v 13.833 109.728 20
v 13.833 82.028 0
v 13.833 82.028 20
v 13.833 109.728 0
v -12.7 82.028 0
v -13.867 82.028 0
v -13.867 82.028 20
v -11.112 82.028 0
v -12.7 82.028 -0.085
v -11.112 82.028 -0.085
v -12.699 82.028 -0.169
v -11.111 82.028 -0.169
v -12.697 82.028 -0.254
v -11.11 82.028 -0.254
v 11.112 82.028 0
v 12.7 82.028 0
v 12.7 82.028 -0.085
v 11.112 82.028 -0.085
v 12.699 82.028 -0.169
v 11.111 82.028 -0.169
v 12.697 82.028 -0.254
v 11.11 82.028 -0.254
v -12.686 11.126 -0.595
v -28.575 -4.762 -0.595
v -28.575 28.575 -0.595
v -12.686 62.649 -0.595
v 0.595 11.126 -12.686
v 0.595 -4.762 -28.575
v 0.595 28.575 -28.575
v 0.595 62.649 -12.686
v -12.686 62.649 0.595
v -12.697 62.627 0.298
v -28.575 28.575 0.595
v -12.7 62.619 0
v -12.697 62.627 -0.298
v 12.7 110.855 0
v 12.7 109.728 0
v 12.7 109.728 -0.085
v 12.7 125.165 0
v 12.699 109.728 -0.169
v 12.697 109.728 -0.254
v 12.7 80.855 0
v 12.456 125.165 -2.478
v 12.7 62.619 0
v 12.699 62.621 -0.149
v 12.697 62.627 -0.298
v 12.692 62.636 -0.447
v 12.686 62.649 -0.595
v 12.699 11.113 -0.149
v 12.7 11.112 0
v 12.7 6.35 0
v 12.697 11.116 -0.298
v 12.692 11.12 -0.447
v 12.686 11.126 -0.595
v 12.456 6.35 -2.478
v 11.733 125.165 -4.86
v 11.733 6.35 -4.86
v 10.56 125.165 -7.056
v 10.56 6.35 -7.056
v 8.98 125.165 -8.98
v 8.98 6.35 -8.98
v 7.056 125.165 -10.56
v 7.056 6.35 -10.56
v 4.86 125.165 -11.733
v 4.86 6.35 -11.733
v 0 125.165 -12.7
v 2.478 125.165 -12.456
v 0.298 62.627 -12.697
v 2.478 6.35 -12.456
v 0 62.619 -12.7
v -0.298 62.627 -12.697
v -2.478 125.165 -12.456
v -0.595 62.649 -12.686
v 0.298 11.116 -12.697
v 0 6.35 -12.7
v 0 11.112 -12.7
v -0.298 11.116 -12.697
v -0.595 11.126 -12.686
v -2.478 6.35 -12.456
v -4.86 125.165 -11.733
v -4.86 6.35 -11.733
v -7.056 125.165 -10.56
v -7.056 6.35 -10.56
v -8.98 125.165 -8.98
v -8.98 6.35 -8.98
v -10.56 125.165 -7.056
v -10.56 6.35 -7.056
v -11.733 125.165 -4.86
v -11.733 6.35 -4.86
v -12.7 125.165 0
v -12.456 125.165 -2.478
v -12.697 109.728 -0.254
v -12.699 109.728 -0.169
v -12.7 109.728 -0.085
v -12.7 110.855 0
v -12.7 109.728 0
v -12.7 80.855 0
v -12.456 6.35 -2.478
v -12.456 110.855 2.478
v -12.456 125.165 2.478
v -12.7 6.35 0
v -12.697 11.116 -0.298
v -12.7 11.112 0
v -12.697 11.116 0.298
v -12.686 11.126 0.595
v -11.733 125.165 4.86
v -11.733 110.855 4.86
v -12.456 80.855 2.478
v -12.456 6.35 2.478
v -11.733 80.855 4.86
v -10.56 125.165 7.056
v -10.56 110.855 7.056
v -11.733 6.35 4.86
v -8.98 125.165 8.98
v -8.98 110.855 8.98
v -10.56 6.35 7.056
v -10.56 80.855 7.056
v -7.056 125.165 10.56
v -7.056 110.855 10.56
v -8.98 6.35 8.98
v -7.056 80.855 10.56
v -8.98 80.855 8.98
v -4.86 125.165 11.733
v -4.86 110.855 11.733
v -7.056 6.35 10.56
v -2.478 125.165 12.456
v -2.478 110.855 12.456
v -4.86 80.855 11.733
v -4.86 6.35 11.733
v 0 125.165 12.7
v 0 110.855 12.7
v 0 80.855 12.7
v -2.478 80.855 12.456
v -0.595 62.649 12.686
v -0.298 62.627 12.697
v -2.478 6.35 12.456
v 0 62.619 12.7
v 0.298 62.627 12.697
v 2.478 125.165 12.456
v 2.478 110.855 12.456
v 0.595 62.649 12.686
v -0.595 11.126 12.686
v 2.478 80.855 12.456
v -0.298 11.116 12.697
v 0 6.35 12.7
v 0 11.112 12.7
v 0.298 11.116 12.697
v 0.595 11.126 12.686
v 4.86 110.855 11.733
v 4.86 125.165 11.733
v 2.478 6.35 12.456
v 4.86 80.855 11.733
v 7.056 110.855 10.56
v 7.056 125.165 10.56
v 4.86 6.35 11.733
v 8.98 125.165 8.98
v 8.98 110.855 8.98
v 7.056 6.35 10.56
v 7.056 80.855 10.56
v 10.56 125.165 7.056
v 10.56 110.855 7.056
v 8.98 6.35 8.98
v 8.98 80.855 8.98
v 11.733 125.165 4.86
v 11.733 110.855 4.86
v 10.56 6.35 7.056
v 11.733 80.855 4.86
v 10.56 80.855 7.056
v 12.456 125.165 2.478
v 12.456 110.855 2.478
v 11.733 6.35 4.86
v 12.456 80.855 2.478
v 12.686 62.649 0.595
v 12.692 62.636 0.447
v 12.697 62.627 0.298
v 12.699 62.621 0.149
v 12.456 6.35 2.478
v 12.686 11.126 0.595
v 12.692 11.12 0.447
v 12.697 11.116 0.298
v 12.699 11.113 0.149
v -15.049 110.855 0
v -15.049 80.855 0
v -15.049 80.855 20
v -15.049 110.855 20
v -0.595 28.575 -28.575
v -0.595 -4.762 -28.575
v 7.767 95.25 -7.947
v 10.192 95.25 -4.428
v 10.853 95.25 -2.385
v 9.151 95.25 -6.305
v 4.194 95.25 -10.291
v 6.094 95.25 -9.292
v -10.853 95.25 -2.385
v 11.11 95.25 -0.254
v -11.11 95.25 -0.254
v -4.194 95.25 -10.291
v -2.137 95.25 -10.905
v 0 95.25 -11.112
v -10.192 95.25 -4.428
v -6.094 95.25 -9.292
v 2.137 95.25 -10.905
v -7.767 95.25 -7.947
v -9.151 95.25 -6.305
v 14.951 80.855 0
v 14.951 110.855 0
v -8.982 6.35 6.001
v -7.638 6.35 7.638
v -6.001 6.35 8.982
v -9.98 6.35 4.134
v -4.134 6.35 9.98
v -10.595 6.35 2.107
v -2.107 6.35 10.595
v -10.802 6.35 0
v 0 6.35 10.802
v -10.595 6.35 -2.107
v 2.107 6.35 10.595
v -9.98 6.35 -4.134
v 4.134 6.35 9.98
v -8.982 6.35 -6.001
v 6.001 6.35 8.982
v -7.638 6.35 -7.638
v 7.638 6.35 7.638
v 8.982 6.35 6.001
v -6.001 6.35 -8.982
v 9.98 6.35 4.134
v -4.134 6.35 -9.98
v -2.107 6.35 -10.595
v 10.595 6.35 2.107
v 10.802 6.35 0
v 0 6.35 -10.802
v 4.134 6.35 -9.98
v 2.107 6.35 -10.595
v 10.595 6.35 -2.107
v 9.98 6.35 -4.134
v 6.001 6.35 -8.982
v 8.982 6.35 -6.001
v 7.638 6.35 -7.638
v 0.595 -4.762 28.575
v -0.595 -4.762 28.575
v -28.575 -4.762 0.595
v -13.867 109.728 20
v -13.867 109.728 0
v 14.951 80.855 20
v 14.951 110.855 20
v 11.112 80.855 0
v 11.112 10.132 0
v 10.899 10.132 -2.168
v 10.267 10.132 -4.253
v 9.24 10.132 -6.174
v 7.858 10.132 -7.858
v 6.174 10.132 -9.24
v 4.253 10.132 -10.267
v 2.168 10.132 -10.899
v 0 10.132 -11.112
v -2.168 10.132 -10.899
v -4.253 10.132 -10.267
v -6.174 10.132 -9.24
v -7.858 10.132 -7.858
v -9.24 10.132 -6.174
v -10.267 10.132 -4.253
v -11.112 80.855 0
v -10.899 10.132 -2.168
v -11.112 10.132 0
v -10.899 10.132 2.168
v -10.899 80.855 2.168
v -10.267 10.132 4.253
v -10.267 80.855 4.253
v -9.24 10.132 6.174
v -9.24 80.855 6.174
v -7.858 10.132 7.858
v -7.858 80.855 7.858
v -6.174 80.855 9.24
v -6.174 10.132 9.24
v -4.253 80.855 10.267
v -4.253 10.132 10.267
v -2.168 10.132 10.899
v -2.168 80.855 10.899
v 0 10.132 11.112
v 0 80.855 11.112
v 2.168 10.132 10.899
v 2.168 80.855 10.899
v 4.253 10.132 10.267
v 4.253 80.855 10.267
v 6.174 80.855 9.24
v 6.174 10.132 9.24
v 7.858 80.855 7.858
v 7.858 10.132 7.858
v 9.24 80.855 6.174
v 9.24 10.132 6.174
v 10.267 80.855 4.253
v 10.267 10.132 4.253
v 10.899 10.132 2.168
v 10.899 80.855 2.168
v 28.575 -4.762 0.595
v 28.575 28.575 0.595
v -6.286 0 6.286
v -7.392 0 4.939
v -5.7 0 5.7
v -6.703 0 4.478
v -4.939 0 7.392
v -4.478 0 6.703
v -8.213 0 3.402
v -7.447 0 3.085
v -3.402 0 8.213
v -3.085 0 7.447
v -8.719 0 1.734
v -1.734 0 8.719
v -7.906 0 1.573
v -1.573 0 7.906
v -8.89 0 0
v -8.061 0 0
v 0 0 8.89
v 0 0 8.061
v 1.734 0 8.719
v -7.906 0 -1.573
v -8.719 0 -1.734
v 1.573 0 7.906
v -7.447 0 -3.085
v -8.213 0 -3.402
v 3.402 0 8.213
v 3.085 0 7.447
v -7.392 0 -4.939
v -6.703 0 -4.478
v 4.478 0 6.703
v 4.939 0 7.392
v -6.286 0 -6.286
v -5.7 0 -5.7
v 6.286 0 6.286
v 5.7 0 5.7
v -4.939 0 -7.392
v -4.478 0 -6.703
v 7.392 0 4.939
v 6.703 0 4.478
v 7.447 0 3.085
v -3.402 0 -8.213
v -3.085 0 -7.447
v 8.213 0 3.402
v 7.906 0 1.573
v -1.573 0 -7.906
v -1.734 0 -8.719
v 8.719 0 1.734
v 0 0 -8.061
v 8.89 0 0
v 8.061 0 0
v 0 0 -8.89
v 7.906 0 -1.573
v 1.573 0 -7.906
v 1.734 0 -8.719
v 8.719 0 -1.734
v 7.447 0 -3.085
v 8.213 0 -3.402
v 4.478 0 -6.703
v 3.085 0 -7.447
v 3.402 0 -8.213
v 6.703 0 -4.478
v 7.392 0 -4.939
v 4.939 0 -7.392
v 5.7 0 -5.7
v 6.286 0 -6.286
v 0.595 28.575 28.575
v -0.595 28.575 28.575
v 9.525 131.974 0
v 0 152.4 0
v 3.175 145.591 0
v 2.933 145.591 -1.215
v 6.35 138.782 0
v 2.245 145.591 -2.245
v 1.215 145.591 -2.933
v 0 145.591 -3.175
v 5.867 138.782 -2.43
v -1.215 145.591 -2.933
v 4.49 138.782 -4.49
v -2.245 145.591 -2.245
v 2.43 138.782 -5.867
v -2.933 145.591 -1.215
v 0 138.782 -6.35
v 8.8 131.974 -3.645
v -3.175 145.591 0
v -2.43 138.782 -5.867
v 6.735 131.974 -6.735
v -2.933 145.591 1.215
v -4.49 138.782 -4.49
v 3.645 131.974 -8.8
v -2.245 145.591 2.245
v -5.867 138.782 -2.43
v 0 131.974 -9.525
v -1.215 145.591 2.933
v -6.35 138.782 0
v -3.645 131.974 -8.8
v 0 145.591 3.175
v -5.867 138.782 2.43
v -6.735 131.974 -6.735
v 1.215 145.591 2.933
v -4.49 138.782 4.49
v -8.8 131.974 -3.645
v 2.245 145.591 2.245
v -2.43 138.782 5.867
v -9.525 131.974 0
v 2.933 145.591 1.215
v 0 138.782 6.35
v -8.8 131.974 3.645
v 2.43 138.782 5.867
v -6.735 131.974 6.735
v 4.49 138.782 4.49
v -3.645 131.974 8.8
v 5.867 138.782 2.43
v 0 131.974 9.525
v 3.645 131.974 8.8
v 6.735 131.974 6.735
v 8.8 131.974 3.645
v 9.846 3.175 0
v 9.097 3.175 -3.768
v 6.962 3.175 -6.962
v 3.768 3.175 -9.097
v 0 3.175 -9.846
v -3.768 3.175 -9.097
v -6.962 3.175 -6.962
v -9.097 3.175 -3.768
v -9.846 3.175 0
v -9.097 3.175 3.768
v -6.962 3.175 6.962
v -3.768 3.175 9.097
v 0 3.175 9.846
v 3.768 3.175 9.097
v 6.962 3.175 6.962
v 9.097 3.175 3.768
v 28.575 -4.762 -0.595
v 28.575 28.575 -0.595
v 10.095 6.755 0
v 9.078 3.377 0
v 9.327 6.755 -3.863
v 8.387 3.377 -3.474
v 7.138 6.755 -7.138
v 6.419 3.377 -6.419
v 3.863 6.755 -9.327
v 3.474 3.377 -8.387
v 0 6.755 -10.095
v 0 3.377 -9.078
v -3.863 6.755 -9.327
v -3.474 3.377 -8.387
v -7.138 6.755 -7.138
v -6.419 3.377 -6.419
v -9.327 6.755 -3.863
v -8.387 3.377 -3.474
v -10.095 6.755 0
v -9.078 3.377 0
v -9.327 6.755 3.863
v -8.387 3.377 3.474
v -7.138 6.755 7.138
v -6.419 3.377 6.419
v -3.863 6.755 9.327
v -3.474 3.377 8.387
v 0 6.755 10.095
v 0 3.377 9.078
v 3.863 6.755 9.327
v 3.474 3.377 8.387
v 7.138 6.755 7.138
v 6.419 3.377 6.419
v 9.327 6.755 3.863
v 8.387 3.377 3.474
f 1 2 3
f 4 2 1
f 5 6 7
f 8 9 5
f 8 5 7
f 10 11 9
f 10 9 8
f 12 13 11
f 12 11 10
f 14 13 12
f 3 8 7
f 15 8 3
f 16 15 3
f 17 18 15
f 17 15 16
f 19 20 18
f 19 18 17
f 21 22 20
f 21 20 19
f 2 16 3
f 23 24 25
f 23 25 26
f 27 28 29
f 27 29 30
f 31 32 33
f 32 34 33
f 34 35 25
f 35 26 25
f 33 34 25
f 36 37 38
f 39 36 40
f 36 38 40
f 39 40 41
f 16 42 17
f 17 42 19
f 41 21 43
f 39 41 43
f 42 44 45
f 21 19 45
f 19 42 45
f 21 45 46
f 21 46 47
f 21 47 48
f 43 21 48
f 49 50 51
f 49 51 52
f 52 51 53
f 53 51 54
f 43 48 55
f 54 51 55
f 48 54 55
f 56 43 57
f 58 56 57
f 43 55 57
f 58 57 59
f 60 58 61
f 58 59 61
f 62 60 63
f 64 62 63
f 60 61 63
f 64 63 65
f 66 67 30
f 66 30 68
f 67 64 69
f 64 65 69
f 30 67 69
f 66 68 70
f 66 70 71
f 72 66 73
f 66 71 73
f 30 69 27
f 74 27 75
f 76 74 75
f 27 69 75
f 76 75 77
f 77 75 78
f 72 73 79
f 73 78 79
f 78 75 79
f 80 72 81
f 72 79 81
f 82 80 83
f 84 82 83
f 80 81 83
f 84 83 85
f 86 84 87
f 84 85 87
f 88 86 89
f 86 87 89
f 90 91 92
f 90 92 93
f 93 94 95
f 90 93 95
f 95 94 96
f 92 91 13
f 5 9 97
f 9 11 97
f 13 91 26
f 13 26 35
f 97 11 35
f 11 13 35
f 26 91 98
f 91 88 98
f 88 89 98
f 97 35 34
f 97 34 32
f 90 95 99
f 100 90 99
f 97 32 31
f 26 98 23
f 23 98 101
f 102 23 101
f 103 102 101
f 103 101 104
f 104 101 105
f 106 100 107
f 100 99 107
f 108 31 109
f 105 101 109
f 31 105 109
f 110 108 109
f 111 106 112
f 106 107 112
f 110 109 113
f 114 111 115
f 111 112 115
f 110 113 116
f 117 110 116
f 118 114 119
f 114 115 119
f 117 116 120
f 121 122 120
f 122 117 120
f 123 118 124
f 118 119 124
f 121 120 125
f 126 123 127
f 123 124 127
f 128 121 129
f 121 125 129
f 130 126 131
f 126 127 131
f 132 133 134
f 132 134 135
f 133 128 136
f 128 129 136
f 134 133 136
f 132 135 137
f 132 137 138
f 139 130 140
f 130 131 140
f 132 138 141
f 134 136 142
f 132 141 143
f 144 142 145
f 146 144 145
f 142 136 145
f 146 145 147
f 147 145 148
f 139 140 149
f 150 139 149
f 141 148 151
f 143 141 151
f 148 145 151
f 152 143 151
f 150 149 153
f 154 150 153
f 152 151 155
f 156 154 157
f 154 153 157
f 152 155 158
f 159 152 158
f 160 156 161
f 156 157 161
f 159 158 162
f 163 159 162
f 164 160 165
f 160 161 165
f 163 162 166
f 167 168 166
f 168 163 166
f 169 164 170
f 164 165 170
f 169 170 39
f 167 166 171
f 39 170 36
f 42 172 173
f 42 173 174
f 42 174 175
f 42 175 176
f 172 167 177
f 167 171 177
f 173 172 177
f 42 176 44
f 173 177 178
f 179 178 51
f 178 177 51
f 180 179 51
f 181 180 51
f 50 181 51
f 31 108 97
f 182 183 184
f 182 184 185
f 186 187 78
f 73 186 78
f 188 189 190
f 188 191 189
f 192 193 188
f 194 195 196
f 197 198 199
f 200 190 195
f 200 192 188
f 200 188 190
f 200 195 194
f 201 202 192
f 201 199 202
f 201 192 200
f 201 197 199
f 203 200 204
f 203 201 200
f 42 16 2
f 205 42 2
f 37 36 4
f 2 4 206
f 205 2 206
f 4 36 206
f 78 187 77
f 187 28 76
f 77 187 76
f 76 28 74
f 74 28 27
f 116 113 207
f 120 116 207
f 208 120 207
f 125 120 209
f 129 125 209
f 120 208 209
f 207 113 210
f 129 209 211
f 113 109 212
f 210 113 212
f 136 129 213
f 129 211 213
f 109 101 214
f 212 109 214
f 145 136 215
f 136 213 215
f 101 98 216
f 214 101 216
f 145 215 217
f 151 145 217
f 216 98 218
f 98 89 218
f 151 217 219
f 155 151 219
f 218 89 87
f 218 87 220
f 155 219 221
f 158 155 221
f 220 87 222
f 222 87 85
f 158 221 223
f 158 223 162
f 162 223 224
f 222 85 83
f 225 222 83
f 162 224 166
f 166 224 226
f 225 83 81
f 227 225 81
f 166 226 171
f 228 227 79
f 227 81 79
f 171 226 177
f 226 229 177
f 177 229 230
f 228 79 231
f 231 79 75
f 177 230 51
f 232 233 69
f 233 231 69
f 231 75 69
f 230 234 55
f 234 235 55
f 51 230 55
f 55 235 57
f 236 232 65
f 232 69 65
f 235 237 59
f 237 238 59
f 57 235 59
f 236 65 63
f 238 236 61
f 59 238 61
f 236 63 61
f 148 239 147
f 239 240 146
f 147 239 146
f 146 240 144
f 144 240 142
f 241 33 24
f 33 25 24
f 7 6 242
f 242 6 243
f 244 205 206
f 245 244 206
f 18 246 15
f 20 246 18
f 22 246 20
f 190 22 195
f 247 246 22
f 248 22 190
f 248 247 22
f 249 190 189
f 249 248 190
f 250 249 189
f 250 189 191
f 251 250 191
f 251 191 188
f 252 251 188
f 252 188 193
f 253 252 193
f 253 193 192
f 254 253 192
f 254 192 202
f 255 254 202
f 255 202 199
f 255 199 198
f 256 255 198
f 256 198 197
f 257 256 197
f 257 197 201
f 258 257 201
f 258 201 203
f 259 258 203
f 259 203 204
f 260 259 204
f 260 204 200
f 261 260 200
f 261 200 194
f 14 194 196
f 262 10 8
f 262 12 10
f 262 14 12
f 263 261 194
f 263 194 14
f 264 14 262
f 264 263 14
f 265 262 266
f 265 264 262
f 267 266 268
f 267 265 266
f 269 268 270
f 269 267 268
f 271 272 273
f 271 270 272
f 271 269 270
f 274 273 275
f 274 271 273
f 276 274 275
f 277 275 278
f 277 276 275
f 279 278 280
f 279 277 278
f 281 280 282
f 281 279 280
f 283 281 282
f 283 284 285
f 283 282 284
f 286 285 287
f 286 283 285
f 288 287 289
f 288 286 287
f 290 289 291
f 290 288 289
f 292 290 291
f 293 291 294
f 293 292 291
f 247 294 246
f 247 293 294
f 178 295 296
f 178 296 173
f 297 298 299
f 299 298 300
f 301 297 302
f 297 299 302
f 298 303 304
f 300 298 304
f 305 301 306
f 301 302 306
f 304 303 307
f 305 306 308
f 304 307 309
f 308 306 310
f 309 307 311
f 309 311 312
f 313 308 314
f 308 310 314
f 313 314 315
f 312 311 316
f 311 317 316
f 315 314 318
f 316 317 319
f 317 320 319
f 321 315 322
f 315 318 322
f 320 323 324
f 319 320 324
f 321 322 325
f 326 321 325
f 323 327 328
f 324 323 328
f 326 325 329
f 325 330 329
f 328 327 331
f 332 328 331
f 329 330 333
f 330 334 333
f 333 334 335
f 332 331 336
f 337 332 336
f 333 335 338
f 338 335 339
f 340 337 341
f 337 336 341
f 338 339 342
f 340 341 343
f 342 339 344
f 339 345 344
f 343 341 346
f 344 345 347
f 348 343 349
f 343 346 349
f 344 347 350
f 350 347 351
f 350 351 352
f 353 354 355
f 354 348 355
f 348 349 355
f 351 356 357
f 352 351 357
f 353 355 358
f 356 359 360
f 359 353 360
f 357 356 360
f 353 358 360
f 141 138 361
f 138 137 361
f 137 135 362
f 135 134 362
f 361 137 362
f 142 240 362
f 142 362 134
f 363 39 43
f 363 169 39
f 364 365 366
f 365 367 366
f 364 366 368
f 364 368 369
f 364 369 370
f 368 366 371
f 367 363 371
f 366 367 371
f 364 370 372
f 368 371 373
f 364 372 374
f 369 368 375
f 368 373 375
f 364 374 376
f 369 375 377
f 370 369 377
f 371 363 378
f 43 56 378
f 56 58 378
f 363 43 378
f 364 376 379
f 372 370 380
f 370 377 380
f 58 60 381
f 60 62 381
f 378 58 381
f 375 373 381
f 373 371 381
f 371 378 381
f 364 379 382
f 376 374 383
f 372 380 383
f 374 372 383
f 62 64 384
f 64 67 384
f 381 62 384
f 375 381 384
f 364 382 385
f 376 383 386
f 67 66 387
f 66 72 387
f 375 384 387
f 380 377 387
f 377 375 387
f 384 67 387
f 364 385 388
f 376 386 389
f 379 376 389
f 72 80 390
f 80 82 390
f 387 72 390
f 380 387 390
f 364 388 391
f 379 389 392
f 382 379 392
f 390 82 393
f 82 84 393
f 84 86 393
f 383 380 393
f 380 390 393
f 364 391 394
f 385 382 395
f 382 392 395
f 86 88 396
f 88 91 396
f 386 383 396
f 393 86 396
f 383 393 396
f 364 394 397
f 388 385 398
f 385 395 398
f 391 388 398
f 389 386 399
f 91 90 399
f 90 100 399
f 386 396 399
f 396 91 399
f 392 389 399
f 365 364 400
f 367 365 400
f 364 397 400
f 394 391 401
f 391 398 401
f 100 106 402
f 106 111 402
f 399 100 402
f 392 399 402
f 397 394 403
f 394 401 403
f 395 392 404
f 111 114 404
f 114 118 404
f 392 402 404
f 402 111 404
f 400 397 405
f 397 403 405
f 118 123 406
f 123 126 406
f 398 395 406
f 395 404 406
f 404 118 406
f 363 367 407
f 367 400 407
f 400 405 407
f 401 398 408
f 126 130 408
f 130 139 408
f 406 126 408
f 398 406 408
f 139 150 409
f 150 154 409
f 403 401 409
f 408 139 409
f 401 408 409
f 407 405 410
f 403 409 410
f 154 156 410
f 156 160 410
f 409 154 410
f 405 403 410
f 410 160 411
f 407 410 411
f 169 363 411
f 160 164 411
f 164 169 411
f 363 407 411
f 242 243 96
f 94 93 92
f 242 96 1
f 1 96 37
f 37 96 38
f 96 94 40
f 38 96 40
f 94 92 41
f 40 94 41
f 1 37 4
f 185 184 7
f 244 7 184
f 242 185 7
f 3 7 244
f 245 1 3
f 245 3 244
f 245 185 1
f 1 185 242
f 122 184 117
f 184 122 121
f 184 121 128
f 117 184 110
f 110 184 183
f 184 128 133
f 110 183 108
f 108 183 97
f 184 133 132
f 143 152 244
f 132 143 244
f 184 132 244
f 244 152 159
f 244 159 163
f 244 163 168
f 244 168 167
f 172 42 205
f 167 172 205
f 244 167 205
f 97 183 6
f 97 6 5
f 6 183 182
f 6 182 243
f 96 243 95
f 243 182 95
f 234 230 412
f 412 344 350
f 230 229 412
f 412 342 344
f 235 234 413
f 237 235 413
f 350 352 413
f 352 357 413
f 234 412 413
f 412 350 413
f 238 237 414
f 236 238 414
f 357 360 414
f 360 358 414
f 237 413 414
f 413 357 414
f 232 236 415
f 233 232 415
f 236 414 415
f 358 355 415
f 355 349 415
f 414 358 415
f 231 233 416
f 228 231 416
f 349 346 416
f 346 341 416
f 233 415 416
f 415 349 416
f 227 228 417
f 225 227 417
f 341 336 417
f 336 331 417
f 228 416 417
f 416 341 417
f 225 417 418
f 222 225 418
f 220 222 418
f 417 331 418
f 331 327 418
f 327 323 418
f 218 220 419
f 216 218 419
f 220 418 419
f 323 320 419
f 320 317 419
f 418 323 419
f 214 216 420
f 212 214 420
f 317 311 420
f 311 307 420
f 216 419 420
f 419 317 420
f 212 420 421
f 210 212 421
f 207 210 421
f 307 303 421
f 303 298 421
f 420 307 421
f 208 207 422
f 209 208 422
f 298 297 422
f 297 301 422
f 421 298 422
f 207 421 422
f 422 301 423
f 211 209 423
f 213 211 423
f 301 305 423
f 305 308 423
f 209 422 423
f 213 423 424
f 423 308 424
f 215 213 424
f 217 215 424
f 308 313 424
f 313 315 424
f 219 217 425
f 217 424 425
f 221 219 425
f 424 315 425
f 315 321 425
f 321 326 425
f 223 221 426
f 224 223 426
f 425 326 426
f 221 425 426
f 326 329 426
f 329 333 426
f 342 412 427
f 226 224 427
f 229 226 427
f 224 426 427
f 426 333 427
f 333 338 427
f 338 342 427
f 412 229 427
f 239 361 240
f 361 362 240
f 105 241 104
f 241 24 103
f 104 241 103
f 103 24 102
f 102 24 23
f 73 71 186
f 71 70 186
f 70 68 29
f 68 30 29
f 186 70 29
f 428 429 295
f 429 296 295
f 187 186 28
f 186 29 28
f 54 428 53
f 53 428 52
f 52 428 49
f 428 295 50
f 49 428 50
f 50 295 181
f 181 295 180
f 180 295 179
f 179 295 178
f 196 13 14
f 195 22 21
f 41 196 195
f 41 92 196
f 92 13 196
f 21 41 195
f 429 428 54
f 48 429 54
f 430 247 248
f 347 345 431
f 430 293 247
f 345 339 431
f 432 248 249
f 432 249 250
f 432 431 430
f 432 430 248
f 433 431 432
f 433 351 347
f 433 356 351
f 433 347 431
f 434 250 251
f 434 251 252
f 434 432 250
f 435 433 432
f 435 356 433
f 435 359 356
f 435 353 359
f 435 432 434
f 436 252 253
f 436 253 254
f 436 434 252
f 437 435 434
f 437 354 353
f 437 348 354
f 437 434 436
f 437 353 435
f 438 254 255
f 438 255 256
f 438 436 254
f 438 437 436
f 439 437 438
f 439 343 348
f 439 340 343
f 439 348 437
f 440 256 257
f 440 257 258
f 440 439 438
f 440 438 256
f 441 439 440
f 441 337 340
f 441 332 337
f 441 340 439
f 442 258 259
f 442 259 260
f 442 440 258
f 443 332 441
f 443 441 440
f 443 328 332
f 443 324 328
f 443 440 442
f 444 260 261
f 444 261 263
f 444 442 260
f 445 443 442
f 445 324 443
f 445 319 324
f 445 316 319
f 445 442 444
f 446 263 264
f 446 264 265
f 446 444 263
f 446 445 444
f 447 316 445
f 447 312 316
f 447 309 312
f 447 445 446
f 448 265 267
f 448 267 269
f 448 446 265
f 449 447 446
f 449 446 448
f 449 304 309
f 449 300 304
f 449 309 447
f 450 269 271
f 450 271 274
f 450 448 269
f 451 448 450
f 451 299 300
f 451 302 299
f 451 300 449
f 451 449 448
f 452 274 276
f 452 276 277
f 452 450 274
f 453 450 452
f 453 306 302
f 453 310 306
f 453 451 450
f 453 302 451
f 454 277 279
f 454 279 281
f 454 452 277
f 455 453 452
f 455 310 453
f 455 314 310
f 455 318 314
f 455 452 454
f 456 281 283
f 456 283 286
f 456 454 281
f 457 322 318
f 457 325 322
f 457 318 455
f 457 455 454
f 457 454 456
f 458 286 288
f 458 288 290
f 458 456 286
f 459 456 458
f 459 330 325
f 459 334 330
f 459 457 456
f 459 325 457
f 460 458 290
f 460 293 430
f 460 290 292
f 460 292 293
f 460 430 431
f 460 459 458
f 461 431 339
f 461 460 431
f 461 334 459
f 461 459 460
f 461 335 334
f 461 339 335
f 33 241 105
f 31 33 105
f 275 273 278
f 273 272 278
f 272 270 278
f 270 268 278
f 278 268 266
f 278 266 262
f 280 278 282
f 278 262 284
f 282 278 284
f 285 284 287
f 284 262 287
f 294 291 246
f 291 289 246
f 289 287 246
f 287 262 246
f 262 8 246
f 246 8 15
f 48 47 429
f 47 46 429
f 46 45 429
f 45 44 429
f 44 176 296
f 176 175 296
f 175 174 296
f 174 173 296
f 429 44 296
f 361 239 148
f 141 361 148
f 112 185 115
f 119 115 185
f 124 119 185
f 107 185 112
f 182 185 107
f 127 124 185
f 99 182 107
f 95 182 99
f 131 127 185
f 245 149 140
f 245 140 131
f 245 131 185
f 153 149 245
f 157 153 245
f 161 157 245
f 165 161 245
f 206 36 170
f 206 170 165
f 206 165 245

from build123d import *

# Parameters (mm, degrees)
BOSS_EXTRUDE1_DEPTH     = 0.5953125
CIRPATTERN1_COUNT       = 4
SKETCH6_W               = 30
SKETCH6_H               = 30
BOSS_EXTRUDE2_DEPTH     = 20
CUT_EXTRUDE2_DEPTH      = 25.636
CUT_EXTRUDE2_DEPTH_BACK = 0.254
SKETCH8_W               = 27.7
SKETCH8_H               = 27.7


with BuildPart() as part:
    # Sketch1 → Revolve2 (revolve)
    with BuildSketch(Plane.XY):
        Polygon((0, 0), (0, 152.4), (12.7, 125.16476211), (12.7, 6.35), (10.80240754, 6.35), (8.89, 0), align=None)
    revolve(axis=Axis((0, -1000, 0), (0, 1, 0)))

    # Sketch3 → Boss-Extrude1 (add, symmetric)
    with BuildSketch(Plane.XY):
        Polygon((11.1125, 66.023452099), (28.575, 28.575), (28.575, -4.7625), (11.1125, 12.7), align=None)
    boss_extrude1 = extrude(amount=BOSS_EXTRUDE1_DEPTH, both=True)

    # CirPattern1: Boss-Extrude1 ×4 about axis
    cirpattern1_axis = Axis((0, -12.620625, 0), (0, 1, 0))
    for i in range(1, CIRPATTERN1_COUNT):
        add(boss_extrude1.rotate(cirpattern1_axis, i * 360 / CIRPATTERN1_COUNT))

    # Sketch5 → Cut-Revolve1 (revolve, cut)
    with BuildSketch(Plane.XY):
        Polygon((0, 95.25), (0, 0), (8.061034129, 0), (11.1125, 10.132154301), (11.1125, 95.25), align=None)
    revolve(axis=Axis((0, -1000, 0), (0, 1, 0)), mode=Mode.SUBTRACT)

    # Sketch6 → Boss-Extrude2 (add)
    with BuildSketch(Plane(origin=(-5.901898503, 3.807192265, 0), x_dir=(1, 0, 0), z_dir=(0, 0, 1))):
        with Locations((5.85297619, 92.047729896)):
            Rectangle(SKETCH6_W, SKETCH6_H)
    extrude(amount=BOSS_EXTRUDE2_DEPTH)

    # Sketch8 → Cut-Extrude2 (cut, two sides: drawn at the far end of the back side and taken through both)
    with BuildSketch(Plane(origin=(72.442949274, -2.579929792, 0), x_dir=(1, 0, 0), z_dir=(0, 0, 1)).offset(-CUT_EXTRUDE2_DEPTH_BACK)):
        with Locations((-72.46037851, 98.457547314)):
            Rectangle(SKETCH8_W, SKETCH8_H)
    extrude(amount=CUT_EXTRUDE2_DEPTH + CUT_EXTRUDE2_DEPTH_BACK, mode=Mode.SUBTRACT)


solid = part.part
